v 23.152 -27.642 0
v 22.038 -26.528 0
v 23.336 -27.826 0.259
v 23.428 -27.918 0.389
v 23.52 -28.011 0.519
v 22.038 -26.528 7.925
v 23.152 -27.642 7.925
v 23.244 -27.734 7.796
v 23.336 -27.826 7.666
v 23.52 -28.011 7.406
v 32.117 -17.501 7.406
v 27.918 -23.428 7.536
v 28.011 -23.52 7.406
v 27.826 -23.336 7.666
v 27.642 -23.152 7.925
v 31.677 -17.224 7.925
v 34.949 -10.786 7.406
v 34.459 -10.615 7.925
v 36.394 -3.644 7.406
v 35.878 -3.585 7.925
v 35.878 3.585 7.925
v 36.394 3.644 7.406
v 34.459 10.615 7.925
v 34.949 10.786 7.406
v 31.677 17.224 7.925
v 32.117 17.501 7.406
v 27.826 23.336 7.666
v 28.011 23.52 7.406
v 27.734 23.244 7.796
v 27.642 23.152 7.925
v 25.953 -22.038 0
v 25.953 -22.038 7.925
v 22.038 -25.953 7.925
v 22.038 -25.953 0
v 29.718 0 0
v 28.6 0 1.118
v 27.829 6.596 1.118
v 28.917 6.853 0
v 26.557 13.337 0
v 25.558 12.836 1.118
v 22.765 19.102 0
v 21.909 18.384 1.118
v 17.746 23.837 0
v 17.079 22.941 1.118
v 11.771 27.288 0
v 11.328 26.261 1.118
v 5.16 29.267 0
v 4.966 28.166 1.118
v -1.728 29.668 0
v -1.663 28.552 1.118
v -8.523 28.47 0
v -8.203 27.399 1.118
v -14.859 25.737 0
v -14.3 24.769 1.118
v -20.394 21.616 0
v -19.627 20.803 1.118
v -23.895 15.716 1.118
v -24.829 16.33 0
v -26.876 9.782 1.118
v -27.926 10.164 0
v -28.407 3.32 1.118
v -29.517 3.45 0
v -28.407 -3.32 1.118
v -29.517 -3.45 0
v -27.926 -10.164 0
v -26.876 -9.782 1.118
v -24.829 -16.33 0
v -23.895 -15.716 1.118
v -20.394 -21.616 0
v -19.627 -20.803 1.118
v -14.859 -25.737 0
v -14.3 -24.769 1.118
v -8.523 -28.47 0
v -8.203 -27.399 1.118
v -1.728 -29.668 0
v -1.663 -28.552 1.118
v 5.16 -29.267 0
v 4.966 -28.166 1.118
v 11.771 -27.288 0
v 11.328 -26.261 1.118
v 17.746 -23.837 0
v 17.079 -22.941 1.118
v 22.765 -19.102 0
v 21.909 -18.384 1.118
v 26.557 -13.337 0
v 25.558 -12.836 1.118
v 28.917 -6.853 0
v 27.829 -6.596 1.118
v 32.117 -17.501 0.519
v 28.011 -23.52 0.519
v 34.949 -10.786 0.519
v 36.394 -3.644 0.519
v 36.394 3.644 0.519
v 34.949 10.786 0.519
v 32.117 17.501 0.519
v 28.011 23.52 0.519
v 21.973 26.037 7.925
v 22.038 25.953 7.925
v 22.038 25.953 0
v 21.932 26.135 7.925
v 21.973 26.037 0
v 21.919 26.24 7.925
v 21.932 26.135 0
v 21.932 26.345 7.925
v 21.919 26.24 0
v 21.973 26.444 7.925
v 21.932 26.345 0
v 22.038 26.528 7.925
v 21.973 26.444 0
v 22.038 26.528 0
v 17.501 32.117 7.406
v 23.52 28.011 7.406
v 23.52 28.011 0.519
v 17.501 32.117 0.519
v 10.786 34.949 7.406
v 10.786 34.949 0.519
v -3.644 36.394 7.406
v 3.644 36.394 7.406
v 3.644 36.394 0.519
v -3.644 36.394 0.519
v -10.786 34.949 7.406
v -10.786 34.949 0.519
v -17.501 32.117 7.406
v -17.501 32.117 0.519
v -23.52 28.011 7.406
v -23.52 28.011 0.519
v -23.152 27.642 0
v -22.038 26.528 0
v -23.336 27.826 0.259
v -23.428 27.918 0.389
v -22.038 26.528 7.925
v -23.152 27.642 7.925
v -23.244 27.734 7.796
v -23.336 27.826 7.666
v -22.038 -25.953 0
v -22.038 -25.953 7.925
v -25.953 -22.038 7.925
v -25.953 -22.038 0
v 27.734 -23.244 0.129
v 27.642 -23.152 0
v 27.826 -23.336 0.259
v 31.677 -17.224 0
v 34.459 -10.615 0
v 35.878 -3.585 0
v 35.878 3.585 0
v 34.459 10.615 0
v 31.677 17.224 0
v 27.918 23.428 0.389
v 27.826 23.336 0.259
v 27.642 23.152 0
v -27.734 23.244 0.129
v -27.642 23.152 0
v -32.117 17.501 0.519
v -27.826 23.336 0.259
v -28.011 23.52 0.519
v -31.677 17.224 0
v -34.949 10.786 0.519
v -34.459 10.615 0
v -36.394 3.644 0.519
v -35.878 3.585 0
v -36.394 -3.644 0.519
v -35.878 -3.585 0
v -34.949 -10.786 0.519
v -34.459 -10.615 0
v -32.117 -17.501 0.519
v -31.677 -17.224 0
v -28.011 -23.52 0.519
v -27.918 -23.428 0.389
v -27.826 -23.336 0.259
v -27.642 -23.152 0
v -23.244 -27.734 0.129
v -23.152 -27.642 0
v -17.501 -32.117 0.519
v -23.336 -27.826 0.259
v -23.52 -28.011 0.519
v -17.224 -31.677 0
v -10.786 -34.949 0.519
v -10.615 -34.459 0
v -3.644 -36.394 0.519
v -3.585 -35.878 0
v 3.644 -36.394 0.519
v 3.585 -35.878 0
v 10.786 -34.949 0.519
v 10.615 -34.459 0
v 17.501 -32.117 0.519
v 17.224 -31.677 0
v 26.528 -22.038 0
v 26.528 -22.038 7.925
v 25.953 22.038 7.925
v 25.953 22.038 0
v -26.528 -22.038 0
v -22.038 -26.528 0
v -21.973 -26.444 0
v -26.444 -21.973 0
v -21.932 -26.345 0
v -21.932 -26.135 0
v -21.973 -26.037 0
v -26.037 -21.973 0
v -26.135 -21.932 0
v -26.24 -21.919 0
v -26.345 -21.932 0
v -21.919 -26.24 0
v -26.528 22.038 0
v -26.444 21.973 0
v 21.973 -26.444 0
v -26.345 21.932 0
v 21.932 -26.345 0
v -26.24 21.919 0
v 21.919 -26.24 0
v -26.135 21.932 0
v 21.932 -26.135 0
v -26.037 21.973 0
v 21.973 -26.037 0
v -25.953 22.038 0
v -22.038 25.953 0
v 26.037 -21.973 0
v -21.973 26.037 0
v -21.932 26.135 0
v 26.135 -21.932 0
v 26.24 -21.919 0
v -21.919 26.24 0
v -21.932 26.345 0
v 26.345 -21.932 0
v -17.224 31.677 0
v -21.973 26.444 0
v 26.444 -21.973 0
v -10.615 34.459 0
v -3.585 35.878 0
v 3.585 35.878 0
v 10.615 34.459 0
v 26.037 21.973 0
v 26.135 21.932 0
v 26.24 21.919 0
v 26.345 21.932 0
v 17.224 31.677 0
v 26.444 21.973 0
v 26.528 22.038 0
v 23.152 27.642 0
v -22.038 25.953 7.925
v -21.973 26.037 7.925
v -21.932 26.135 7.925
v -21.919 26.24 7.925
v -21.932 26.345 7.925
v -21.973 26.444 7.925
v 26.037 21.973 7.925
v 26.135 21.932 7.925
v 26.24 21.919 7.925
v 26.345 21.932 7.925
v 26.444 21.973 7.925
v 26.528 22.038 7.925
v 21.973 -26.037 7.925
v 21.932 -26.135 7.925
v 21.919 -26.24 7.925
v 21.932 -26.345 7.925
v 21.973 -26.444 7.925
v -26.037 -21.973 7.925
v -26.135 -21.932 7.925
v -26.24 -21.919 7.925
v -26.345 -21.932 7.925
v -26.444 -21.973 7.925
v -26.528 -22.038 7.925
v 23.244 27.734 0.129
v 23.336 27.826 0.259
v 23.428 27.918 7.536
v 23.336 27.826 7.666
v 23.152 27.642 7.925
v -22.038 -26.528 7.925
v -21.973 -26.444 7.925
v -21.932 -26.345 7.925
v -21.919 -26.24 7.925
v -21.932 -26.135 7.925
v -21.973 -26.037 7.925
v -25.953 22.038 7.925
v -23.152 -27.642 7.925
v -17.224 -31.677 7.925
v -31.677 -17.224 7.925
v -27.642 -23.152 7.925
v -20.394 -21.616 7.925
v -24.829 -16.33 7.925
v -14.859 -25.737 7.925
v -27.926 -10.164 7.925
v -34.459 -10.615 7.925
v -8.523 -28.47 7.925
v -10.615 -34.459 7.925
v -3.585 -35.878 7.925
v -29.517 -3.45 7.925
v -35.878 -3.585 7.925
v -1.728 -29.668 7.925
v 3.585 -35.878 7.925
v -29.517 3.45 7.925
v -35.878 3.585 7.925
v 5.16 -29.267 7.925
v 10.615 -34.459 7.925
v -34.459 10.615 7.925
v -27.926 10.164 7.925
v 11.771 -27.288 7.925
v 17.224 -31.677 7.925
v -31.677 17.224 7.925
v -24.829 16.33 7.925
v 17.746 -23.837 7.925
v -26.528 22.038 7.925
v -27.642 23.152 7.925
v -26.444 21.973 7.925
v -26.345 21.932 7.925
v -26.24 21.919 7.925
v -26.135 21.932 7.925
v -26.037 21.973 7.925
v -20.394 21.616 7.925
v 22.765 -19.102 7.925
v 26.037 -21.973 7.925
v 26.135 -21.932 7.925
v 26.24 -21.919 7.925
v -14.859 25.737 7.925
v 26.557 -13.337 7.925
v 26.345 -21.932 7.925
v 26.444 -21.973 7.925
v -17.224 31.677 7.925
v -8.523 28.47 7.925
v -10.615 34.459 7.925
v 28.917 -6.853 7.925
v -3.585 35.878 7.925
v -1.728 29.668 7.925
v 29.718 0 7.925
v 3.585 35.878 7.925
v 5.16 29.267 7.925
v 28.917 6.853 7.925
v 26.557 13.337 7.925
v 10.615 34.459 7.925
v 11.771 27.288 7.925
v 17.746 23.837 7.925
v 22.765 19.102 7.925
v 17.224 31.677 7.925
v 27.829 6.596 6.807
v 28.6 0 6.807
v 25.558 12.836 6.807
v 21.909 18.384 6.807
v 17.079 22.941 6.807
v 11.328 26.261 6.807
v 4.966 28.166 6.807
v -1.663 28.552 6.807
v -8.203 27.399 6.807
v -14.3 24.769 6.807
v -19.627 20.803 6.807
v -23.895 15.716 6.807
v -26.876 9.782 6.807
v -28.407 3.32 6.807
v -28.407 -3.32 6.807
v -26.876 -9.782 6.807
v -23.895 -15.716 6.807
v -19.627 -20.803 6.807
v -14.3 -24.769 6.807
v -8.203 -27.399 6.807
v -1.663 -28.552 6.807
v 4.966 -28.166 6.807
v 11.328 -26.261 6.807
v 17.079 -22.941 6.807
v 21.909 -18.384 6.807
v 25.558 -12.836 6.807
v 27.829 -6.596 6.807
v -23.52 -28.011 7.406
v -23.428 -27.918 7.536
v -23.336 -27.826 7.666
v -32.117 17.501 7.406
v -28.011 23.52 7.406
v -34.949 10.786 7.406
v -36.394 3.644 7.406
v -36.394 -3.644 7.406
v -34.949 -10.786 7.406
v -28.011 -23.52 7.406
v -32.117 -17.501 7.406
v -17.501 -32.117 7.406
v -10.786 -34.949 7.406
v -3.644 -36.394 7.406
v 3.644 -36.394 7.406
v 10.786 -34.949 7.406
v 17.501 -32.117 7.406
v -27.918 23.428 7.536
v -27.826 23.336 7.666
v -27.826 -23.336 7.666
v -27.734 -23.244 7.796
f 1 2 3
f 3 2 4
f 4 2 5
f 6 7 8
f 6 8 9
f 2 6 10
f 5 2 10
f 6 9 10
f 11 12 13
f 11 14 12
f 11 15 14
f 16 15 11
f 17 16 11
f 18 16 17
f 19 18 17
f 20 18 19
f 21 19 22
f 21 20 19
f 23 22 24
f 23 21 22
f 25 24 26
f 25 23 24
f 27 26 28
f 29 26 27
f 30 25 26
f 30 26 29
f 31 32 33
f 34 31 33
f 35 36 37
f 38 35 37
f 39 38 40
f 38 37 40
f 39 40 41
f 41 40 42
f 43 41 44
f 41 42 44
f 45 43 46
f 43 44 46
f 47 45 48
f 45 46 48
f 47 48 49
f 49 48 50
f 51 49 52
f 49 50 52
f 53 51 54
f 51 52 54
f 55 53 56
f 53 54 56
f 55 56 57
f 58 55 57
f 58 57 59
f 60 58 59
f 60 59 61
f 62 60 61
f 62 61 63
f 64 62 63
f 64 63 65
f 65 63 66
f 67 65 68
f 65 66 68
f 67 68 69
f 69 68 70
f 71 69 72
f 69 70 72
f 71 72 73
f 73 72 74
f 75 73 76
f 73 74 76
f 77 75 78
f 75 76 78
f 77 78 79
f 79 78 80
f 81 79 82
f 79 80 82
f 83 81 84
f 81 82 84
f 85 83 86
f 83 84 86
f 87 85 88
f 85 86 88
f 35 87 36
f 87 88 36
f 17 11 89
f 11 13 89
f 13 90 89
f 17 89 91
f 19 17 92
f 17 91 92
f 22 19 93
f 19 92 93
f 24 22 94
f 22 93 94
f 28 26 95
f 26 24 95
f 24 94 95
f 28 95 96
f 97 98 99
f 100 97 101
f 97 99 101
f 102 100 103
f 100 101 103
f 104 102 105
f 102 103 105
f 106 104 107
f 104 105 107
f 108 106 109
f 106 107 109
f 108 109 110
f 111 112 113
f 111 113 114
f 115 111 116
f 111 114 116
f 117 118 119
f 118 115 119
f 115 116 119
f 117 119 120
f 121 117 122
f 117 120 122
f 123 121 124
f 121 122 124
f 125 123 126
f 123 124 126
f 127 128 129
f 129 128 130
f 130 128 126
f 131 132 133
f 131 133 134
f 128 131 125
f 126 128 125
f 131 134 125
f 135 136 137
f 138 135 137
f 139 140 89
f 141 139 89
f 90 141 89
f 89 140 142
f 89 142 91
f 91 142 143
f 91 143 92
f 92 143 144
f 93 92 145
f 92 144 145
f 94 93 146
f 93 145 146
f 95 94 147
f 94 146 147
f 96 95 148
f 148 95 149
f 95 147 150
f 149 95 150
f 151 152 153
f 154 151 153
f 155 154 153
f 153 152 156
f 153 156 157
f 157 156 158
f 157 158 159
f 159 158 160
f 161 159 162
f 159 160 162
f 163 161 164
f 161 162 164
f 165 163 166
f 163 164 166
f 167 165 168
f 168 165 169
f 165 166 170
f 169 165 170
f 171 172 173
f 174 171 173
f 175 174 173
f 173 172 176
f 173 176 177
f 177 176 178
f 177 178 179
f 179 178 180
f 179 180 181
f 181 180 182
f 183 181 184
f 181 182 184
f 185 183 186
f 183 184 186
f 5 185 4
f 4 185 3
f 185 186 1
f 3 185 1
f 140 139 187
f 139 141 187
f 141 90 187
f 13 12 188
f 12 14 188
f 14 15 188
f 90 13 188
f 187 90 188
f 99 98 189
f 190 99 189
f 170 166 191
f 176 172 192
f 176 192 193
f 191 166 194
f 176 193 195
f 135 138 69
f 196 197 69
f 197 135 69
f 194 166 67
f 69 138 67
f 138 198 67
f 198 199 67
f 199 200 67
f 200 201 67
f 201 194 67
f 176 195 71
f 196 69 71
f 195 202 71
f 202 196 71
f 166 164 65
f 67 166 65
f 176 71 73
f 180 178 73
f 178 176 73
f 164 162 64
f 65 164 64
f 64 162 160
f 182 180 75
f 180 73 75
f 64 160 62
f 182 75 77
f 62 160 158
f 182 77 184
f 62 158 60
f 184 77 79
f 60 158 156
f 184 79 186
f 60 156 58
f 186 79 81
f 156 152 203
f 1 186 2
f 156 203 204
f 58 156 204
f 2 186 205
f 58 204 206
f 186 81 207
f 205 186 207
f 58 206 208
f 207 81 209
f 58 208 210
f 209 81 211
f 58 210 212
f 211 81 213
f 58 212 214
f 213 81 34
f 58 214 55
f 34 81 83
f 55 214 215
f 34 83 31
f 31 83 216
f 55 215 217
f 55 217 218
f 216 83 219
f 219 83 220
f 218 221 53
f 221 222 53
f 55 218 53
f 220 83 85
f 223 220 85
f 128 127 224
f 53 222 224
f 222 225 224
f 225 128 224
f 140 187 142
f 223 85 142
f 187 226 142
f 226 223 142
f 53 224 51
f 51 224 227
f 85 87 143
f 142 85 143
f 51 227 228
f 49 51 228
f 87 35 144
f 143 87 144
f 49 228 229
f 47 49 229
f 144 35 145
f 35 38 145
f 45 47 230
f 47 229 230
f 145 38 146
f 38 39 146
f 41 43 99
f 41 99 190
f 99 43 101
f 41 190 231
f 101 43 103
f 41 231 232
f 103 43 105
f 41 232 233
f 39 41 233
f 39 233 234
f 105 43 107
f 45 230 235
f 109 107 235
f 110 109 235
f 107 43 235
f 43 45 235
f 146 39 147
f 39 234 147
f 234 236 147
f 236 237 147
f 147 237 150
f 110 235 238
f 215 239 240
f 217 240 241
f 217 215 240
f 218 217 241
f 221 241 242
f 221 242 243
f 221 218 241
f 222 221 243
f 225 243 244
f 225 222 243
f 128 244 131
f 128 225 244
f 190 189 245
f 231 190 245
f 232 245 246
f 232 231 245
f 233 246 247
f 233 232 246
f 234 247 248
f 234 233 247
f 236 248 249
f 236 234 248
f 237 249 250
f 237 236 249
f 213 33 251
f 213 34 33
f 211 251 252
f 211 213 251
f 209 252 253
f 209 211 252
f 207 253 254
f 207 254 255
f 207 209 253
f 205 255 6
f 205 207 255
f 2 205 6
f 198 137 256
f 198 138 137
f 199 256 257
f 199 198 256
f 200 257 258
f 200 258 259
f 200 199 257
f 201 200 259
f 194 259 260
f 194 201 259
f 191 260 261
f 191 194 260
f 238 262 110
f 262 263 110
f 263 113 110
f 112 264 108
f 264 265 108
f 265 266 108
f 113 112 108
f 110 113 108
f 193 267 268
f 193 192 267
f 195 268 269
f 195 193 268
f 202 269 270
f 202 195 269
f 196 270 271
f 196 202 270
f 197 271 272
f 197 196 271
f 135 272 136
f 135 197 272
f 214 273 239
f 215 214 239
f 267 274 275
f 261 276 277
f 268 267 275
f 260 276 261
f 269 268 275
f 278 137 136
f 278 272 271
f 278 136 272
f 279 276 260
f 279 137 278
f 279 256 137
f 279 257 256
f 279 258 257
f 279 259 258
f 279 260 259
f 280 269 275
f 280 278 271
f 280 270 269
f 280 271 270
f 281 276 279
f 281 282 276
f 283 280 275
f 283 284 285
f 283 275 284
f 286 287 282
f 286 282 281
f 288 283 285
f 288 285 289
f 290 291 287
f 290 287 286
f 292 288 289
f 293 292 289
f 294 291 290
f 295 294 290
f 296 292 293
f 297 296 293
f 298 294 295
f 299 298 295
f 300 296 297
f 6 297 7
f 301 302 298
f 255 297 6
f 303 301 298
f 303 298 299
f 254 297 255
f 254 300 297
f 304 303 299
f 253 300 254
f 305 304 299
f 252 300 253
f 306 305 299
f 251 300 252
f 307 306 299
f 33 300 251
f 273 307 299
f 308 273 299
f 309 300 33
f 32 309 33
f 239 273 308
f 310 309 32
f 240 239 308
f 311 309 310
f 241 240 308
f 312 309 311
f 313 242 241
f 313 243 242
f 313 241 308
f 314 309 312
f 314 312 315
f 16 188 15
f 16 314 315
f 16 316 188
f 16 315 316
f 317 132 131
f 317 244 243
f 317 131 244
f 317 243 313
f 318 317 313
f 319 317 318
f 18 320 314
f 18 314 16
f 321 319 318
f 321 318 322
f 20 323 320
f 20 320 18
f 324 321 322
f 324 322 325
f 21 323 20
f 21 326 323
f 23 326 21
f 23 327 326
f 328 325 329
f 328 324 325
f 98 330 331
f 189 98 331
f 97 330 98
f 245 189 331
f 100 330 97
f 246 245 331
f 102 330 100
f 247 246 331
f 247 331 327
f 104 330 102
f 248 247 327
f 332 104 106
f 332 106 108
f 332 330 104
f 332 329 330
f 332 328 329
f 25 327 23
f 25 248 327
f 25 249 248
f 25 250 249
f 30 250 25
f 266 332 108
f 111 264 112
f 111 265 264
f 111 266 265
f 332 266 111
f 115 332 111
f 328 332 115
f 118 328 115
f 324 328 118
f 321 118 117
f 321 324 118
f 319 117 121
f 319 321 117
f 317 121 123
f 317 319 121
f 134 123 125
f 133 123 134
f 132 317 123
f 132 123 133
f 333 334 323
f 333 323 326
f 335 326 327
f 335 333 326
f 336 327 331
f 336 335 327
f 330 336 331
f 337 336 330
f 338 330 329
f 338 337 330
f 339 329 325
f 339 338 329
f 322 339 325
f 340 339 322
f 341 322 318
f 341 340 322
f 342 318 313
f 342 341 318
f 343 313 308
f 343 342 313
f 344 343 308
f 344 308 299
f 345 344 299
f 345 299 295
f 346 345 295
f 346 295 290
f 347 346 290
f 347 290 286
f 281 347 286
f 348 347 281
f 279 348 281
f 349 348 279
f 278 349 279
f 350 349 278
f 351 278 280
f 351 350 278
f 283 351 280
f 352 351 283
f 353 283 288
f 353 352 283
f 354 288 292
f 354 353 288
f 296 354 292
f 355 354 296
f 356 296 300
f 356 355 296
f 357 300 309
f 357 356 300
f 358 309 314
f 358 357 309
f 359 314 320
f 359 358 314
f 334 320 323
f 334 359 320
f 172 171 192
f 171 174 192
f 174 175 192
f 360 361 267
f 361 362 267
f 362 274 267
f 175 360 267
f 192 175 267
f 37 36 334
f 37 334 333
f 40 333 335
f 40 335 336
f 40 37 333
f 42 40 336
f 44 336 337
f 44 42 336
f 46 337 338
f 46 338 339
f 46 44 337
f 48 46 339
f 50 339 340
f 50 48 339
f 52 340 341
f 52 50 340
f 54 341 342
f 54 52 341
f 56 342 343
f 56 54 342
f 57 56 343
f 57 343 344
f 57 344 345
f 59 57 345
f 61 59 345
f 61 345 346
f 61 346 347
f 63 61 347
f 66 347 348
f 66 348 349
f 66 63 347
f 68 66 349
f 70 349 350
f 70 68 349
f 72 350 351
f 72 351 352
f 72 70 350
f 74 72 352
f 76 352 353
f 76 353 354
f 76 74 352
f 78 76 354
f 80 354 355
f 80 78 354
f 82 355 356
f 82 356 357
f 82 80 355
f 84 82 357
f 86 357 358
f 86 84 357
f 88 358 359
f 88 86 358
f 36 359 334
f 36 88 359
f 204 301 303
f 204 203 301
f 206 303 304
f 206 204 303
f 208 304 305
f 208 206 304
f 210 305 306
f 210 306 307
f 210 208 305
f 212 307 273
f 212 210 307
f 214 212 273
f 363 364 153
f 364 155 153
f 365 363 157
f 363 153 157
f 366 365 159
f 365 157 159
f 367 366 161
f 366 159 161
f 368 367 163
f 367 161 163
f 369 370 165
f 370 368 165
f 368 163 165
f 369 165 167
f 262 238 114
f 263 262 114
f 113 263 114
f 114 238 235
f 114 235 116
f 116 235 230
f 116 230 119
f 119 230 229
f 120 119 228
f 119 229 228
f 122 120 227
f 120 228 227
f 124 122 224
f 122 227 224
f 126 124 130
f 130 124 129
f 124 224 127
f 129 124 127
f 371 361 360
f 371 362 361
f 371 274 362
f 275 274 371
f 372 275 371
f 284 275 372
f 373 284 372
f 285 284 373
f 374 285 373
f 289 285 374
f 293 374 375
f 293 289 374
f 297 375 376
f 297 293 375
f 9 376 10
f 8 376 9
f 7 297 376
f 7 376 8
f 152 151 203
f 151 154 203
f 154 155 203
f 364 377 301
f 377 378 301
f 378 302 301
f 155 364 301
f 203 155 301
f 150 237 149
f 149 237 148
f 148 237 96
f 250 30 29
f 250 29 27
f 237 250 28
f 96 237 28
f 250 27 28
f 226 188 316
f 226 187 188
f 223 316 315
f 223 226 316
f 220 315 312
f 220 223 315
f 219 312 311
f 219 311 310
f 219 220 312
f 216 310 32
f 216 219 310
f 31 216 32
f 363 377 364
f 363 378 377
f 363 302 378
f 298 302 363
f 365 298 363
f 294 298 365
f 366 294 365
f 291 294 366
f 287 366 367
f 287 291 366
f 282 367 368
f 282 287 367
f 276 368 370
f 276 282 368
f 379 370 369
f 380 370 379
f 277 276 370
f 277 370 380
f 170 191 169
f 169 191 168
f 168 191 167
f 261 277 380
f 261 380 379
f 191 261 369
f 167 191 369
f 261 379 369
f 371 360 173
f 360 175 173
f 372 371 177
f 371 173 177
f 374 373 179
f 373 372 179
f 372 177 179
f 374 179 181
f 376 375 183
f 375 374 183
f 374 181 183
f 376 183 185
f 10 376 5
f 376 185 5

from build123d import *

# Parameters (mm, degrees)
SKETCH1_R                = 36.576
SKETCH1_R_2              = 28.6004
EXTRUDE1_DEPTH           = 7.9248
CHAMFER1_SIZE            = 0.519176
CHAMFER2_SIZE            = 1.1176
CUT_EXTRUDE1_DEPTH       = 8.9248
FILLET1_R                = 0.4064
CIRPATTERN1_COUNT        = 4
FILLET1_OF_CIRPATTERN1_R = 0.4064


with BuildPart() as part:
    # Sketch1 → Extrude1 (new body)
    with BuildSketch(Plane.XY):
        Circle(SKETCH1_R)
        Circle(SKETCH1_R_2, mode=Mode.SUBTRACT)
    extrude(amount=EXTRUDE1_DEPTH)

    # Chamfer1
    chamfer1_edges = [part.edges().sort_by_distance(p)[0] for p in [
        (-36.576, 0, 0),
        (-36.576, 0, 7.9248),
    ]]
    chamfer(chamfer1_edges, length=CHAMFER1_SIZE)

    # Chamfer2
    chamfer2_edges = [part.edges().sort_by_distance(p)[0] for p in [
        (-28.6004, 0, 0),
        (-28.6004, 0, 7.9248),
    ]]
    chamfer(chamfer2_edges, length=CHAMFER2_SIZE)

    # Sketch2 → Cut-Extrude1 (cut, through all)
    with BuildSketch(Plane.XY.offset(7.9248)):
        with BuildLine():
            Line((23.520447327, 28.010575388), (21.750180325, 26.240308386))
            Line((21.750180325, 26.240308386), (26.240308386, 21.750180325))
            Line((26.240308386, 21.750180325), (28.010575388, 23.520447327))
            ThreePointArc((28.010575388, 23.520447327), (25.863137629, 25.863137629), (23.520447327, 28.010575388))
        make_face()
    cut_extrude1 = extrude(amount=-CUT_EXTRUDE1_DEPTH, mode=Mode.SUBTRACT)

    # Fillet1
    fillet1_edges = [part.edges().sort_by_distance(p)[0] for p in [
        (26.240308386, 21.750180325, 3.9624),
        (21.750180325, 26.240308386, 3.9624),
    ]]
    fillet(fillet1_edges, radius=FILLET1_R)

    # CirPattern1: Cut-Extrude1 ×4 about axis
    cirpattern1_axis = Axis((0, 0, 0), (0, 0, 1))
    for i in range(1, CIRPATTERN1_COUNT):
        add(cut_extrude1.rotate(cirpattern1_axis, i * 360 / CIRPATTERN1_COUNT), mode=Mode.SUBTRACT)

    # Fillet1 of CirPattern1
    fillet1_of_cirpattern1_edges = [part.edges().sort_by_distance(p)[0] for p in [
        (-21.750180325, 26.240308386, 3.9624),
        (-26.240308386, 21.750180325, 3.9624),
        (-26.240308386, -21.750180325, 3.9624),
        (-21.750180325, -26.240308386, 3.9624),
        (21.750180325, -26.240308386, 3.9624),
        (26.240308386, -21.750180325, 3.9624),
    ]]
    fillet(fillet1_of_cirpattern1_edges, radius=FILLET1_OF_CIRPATTERN1_R)


solid = part.part
